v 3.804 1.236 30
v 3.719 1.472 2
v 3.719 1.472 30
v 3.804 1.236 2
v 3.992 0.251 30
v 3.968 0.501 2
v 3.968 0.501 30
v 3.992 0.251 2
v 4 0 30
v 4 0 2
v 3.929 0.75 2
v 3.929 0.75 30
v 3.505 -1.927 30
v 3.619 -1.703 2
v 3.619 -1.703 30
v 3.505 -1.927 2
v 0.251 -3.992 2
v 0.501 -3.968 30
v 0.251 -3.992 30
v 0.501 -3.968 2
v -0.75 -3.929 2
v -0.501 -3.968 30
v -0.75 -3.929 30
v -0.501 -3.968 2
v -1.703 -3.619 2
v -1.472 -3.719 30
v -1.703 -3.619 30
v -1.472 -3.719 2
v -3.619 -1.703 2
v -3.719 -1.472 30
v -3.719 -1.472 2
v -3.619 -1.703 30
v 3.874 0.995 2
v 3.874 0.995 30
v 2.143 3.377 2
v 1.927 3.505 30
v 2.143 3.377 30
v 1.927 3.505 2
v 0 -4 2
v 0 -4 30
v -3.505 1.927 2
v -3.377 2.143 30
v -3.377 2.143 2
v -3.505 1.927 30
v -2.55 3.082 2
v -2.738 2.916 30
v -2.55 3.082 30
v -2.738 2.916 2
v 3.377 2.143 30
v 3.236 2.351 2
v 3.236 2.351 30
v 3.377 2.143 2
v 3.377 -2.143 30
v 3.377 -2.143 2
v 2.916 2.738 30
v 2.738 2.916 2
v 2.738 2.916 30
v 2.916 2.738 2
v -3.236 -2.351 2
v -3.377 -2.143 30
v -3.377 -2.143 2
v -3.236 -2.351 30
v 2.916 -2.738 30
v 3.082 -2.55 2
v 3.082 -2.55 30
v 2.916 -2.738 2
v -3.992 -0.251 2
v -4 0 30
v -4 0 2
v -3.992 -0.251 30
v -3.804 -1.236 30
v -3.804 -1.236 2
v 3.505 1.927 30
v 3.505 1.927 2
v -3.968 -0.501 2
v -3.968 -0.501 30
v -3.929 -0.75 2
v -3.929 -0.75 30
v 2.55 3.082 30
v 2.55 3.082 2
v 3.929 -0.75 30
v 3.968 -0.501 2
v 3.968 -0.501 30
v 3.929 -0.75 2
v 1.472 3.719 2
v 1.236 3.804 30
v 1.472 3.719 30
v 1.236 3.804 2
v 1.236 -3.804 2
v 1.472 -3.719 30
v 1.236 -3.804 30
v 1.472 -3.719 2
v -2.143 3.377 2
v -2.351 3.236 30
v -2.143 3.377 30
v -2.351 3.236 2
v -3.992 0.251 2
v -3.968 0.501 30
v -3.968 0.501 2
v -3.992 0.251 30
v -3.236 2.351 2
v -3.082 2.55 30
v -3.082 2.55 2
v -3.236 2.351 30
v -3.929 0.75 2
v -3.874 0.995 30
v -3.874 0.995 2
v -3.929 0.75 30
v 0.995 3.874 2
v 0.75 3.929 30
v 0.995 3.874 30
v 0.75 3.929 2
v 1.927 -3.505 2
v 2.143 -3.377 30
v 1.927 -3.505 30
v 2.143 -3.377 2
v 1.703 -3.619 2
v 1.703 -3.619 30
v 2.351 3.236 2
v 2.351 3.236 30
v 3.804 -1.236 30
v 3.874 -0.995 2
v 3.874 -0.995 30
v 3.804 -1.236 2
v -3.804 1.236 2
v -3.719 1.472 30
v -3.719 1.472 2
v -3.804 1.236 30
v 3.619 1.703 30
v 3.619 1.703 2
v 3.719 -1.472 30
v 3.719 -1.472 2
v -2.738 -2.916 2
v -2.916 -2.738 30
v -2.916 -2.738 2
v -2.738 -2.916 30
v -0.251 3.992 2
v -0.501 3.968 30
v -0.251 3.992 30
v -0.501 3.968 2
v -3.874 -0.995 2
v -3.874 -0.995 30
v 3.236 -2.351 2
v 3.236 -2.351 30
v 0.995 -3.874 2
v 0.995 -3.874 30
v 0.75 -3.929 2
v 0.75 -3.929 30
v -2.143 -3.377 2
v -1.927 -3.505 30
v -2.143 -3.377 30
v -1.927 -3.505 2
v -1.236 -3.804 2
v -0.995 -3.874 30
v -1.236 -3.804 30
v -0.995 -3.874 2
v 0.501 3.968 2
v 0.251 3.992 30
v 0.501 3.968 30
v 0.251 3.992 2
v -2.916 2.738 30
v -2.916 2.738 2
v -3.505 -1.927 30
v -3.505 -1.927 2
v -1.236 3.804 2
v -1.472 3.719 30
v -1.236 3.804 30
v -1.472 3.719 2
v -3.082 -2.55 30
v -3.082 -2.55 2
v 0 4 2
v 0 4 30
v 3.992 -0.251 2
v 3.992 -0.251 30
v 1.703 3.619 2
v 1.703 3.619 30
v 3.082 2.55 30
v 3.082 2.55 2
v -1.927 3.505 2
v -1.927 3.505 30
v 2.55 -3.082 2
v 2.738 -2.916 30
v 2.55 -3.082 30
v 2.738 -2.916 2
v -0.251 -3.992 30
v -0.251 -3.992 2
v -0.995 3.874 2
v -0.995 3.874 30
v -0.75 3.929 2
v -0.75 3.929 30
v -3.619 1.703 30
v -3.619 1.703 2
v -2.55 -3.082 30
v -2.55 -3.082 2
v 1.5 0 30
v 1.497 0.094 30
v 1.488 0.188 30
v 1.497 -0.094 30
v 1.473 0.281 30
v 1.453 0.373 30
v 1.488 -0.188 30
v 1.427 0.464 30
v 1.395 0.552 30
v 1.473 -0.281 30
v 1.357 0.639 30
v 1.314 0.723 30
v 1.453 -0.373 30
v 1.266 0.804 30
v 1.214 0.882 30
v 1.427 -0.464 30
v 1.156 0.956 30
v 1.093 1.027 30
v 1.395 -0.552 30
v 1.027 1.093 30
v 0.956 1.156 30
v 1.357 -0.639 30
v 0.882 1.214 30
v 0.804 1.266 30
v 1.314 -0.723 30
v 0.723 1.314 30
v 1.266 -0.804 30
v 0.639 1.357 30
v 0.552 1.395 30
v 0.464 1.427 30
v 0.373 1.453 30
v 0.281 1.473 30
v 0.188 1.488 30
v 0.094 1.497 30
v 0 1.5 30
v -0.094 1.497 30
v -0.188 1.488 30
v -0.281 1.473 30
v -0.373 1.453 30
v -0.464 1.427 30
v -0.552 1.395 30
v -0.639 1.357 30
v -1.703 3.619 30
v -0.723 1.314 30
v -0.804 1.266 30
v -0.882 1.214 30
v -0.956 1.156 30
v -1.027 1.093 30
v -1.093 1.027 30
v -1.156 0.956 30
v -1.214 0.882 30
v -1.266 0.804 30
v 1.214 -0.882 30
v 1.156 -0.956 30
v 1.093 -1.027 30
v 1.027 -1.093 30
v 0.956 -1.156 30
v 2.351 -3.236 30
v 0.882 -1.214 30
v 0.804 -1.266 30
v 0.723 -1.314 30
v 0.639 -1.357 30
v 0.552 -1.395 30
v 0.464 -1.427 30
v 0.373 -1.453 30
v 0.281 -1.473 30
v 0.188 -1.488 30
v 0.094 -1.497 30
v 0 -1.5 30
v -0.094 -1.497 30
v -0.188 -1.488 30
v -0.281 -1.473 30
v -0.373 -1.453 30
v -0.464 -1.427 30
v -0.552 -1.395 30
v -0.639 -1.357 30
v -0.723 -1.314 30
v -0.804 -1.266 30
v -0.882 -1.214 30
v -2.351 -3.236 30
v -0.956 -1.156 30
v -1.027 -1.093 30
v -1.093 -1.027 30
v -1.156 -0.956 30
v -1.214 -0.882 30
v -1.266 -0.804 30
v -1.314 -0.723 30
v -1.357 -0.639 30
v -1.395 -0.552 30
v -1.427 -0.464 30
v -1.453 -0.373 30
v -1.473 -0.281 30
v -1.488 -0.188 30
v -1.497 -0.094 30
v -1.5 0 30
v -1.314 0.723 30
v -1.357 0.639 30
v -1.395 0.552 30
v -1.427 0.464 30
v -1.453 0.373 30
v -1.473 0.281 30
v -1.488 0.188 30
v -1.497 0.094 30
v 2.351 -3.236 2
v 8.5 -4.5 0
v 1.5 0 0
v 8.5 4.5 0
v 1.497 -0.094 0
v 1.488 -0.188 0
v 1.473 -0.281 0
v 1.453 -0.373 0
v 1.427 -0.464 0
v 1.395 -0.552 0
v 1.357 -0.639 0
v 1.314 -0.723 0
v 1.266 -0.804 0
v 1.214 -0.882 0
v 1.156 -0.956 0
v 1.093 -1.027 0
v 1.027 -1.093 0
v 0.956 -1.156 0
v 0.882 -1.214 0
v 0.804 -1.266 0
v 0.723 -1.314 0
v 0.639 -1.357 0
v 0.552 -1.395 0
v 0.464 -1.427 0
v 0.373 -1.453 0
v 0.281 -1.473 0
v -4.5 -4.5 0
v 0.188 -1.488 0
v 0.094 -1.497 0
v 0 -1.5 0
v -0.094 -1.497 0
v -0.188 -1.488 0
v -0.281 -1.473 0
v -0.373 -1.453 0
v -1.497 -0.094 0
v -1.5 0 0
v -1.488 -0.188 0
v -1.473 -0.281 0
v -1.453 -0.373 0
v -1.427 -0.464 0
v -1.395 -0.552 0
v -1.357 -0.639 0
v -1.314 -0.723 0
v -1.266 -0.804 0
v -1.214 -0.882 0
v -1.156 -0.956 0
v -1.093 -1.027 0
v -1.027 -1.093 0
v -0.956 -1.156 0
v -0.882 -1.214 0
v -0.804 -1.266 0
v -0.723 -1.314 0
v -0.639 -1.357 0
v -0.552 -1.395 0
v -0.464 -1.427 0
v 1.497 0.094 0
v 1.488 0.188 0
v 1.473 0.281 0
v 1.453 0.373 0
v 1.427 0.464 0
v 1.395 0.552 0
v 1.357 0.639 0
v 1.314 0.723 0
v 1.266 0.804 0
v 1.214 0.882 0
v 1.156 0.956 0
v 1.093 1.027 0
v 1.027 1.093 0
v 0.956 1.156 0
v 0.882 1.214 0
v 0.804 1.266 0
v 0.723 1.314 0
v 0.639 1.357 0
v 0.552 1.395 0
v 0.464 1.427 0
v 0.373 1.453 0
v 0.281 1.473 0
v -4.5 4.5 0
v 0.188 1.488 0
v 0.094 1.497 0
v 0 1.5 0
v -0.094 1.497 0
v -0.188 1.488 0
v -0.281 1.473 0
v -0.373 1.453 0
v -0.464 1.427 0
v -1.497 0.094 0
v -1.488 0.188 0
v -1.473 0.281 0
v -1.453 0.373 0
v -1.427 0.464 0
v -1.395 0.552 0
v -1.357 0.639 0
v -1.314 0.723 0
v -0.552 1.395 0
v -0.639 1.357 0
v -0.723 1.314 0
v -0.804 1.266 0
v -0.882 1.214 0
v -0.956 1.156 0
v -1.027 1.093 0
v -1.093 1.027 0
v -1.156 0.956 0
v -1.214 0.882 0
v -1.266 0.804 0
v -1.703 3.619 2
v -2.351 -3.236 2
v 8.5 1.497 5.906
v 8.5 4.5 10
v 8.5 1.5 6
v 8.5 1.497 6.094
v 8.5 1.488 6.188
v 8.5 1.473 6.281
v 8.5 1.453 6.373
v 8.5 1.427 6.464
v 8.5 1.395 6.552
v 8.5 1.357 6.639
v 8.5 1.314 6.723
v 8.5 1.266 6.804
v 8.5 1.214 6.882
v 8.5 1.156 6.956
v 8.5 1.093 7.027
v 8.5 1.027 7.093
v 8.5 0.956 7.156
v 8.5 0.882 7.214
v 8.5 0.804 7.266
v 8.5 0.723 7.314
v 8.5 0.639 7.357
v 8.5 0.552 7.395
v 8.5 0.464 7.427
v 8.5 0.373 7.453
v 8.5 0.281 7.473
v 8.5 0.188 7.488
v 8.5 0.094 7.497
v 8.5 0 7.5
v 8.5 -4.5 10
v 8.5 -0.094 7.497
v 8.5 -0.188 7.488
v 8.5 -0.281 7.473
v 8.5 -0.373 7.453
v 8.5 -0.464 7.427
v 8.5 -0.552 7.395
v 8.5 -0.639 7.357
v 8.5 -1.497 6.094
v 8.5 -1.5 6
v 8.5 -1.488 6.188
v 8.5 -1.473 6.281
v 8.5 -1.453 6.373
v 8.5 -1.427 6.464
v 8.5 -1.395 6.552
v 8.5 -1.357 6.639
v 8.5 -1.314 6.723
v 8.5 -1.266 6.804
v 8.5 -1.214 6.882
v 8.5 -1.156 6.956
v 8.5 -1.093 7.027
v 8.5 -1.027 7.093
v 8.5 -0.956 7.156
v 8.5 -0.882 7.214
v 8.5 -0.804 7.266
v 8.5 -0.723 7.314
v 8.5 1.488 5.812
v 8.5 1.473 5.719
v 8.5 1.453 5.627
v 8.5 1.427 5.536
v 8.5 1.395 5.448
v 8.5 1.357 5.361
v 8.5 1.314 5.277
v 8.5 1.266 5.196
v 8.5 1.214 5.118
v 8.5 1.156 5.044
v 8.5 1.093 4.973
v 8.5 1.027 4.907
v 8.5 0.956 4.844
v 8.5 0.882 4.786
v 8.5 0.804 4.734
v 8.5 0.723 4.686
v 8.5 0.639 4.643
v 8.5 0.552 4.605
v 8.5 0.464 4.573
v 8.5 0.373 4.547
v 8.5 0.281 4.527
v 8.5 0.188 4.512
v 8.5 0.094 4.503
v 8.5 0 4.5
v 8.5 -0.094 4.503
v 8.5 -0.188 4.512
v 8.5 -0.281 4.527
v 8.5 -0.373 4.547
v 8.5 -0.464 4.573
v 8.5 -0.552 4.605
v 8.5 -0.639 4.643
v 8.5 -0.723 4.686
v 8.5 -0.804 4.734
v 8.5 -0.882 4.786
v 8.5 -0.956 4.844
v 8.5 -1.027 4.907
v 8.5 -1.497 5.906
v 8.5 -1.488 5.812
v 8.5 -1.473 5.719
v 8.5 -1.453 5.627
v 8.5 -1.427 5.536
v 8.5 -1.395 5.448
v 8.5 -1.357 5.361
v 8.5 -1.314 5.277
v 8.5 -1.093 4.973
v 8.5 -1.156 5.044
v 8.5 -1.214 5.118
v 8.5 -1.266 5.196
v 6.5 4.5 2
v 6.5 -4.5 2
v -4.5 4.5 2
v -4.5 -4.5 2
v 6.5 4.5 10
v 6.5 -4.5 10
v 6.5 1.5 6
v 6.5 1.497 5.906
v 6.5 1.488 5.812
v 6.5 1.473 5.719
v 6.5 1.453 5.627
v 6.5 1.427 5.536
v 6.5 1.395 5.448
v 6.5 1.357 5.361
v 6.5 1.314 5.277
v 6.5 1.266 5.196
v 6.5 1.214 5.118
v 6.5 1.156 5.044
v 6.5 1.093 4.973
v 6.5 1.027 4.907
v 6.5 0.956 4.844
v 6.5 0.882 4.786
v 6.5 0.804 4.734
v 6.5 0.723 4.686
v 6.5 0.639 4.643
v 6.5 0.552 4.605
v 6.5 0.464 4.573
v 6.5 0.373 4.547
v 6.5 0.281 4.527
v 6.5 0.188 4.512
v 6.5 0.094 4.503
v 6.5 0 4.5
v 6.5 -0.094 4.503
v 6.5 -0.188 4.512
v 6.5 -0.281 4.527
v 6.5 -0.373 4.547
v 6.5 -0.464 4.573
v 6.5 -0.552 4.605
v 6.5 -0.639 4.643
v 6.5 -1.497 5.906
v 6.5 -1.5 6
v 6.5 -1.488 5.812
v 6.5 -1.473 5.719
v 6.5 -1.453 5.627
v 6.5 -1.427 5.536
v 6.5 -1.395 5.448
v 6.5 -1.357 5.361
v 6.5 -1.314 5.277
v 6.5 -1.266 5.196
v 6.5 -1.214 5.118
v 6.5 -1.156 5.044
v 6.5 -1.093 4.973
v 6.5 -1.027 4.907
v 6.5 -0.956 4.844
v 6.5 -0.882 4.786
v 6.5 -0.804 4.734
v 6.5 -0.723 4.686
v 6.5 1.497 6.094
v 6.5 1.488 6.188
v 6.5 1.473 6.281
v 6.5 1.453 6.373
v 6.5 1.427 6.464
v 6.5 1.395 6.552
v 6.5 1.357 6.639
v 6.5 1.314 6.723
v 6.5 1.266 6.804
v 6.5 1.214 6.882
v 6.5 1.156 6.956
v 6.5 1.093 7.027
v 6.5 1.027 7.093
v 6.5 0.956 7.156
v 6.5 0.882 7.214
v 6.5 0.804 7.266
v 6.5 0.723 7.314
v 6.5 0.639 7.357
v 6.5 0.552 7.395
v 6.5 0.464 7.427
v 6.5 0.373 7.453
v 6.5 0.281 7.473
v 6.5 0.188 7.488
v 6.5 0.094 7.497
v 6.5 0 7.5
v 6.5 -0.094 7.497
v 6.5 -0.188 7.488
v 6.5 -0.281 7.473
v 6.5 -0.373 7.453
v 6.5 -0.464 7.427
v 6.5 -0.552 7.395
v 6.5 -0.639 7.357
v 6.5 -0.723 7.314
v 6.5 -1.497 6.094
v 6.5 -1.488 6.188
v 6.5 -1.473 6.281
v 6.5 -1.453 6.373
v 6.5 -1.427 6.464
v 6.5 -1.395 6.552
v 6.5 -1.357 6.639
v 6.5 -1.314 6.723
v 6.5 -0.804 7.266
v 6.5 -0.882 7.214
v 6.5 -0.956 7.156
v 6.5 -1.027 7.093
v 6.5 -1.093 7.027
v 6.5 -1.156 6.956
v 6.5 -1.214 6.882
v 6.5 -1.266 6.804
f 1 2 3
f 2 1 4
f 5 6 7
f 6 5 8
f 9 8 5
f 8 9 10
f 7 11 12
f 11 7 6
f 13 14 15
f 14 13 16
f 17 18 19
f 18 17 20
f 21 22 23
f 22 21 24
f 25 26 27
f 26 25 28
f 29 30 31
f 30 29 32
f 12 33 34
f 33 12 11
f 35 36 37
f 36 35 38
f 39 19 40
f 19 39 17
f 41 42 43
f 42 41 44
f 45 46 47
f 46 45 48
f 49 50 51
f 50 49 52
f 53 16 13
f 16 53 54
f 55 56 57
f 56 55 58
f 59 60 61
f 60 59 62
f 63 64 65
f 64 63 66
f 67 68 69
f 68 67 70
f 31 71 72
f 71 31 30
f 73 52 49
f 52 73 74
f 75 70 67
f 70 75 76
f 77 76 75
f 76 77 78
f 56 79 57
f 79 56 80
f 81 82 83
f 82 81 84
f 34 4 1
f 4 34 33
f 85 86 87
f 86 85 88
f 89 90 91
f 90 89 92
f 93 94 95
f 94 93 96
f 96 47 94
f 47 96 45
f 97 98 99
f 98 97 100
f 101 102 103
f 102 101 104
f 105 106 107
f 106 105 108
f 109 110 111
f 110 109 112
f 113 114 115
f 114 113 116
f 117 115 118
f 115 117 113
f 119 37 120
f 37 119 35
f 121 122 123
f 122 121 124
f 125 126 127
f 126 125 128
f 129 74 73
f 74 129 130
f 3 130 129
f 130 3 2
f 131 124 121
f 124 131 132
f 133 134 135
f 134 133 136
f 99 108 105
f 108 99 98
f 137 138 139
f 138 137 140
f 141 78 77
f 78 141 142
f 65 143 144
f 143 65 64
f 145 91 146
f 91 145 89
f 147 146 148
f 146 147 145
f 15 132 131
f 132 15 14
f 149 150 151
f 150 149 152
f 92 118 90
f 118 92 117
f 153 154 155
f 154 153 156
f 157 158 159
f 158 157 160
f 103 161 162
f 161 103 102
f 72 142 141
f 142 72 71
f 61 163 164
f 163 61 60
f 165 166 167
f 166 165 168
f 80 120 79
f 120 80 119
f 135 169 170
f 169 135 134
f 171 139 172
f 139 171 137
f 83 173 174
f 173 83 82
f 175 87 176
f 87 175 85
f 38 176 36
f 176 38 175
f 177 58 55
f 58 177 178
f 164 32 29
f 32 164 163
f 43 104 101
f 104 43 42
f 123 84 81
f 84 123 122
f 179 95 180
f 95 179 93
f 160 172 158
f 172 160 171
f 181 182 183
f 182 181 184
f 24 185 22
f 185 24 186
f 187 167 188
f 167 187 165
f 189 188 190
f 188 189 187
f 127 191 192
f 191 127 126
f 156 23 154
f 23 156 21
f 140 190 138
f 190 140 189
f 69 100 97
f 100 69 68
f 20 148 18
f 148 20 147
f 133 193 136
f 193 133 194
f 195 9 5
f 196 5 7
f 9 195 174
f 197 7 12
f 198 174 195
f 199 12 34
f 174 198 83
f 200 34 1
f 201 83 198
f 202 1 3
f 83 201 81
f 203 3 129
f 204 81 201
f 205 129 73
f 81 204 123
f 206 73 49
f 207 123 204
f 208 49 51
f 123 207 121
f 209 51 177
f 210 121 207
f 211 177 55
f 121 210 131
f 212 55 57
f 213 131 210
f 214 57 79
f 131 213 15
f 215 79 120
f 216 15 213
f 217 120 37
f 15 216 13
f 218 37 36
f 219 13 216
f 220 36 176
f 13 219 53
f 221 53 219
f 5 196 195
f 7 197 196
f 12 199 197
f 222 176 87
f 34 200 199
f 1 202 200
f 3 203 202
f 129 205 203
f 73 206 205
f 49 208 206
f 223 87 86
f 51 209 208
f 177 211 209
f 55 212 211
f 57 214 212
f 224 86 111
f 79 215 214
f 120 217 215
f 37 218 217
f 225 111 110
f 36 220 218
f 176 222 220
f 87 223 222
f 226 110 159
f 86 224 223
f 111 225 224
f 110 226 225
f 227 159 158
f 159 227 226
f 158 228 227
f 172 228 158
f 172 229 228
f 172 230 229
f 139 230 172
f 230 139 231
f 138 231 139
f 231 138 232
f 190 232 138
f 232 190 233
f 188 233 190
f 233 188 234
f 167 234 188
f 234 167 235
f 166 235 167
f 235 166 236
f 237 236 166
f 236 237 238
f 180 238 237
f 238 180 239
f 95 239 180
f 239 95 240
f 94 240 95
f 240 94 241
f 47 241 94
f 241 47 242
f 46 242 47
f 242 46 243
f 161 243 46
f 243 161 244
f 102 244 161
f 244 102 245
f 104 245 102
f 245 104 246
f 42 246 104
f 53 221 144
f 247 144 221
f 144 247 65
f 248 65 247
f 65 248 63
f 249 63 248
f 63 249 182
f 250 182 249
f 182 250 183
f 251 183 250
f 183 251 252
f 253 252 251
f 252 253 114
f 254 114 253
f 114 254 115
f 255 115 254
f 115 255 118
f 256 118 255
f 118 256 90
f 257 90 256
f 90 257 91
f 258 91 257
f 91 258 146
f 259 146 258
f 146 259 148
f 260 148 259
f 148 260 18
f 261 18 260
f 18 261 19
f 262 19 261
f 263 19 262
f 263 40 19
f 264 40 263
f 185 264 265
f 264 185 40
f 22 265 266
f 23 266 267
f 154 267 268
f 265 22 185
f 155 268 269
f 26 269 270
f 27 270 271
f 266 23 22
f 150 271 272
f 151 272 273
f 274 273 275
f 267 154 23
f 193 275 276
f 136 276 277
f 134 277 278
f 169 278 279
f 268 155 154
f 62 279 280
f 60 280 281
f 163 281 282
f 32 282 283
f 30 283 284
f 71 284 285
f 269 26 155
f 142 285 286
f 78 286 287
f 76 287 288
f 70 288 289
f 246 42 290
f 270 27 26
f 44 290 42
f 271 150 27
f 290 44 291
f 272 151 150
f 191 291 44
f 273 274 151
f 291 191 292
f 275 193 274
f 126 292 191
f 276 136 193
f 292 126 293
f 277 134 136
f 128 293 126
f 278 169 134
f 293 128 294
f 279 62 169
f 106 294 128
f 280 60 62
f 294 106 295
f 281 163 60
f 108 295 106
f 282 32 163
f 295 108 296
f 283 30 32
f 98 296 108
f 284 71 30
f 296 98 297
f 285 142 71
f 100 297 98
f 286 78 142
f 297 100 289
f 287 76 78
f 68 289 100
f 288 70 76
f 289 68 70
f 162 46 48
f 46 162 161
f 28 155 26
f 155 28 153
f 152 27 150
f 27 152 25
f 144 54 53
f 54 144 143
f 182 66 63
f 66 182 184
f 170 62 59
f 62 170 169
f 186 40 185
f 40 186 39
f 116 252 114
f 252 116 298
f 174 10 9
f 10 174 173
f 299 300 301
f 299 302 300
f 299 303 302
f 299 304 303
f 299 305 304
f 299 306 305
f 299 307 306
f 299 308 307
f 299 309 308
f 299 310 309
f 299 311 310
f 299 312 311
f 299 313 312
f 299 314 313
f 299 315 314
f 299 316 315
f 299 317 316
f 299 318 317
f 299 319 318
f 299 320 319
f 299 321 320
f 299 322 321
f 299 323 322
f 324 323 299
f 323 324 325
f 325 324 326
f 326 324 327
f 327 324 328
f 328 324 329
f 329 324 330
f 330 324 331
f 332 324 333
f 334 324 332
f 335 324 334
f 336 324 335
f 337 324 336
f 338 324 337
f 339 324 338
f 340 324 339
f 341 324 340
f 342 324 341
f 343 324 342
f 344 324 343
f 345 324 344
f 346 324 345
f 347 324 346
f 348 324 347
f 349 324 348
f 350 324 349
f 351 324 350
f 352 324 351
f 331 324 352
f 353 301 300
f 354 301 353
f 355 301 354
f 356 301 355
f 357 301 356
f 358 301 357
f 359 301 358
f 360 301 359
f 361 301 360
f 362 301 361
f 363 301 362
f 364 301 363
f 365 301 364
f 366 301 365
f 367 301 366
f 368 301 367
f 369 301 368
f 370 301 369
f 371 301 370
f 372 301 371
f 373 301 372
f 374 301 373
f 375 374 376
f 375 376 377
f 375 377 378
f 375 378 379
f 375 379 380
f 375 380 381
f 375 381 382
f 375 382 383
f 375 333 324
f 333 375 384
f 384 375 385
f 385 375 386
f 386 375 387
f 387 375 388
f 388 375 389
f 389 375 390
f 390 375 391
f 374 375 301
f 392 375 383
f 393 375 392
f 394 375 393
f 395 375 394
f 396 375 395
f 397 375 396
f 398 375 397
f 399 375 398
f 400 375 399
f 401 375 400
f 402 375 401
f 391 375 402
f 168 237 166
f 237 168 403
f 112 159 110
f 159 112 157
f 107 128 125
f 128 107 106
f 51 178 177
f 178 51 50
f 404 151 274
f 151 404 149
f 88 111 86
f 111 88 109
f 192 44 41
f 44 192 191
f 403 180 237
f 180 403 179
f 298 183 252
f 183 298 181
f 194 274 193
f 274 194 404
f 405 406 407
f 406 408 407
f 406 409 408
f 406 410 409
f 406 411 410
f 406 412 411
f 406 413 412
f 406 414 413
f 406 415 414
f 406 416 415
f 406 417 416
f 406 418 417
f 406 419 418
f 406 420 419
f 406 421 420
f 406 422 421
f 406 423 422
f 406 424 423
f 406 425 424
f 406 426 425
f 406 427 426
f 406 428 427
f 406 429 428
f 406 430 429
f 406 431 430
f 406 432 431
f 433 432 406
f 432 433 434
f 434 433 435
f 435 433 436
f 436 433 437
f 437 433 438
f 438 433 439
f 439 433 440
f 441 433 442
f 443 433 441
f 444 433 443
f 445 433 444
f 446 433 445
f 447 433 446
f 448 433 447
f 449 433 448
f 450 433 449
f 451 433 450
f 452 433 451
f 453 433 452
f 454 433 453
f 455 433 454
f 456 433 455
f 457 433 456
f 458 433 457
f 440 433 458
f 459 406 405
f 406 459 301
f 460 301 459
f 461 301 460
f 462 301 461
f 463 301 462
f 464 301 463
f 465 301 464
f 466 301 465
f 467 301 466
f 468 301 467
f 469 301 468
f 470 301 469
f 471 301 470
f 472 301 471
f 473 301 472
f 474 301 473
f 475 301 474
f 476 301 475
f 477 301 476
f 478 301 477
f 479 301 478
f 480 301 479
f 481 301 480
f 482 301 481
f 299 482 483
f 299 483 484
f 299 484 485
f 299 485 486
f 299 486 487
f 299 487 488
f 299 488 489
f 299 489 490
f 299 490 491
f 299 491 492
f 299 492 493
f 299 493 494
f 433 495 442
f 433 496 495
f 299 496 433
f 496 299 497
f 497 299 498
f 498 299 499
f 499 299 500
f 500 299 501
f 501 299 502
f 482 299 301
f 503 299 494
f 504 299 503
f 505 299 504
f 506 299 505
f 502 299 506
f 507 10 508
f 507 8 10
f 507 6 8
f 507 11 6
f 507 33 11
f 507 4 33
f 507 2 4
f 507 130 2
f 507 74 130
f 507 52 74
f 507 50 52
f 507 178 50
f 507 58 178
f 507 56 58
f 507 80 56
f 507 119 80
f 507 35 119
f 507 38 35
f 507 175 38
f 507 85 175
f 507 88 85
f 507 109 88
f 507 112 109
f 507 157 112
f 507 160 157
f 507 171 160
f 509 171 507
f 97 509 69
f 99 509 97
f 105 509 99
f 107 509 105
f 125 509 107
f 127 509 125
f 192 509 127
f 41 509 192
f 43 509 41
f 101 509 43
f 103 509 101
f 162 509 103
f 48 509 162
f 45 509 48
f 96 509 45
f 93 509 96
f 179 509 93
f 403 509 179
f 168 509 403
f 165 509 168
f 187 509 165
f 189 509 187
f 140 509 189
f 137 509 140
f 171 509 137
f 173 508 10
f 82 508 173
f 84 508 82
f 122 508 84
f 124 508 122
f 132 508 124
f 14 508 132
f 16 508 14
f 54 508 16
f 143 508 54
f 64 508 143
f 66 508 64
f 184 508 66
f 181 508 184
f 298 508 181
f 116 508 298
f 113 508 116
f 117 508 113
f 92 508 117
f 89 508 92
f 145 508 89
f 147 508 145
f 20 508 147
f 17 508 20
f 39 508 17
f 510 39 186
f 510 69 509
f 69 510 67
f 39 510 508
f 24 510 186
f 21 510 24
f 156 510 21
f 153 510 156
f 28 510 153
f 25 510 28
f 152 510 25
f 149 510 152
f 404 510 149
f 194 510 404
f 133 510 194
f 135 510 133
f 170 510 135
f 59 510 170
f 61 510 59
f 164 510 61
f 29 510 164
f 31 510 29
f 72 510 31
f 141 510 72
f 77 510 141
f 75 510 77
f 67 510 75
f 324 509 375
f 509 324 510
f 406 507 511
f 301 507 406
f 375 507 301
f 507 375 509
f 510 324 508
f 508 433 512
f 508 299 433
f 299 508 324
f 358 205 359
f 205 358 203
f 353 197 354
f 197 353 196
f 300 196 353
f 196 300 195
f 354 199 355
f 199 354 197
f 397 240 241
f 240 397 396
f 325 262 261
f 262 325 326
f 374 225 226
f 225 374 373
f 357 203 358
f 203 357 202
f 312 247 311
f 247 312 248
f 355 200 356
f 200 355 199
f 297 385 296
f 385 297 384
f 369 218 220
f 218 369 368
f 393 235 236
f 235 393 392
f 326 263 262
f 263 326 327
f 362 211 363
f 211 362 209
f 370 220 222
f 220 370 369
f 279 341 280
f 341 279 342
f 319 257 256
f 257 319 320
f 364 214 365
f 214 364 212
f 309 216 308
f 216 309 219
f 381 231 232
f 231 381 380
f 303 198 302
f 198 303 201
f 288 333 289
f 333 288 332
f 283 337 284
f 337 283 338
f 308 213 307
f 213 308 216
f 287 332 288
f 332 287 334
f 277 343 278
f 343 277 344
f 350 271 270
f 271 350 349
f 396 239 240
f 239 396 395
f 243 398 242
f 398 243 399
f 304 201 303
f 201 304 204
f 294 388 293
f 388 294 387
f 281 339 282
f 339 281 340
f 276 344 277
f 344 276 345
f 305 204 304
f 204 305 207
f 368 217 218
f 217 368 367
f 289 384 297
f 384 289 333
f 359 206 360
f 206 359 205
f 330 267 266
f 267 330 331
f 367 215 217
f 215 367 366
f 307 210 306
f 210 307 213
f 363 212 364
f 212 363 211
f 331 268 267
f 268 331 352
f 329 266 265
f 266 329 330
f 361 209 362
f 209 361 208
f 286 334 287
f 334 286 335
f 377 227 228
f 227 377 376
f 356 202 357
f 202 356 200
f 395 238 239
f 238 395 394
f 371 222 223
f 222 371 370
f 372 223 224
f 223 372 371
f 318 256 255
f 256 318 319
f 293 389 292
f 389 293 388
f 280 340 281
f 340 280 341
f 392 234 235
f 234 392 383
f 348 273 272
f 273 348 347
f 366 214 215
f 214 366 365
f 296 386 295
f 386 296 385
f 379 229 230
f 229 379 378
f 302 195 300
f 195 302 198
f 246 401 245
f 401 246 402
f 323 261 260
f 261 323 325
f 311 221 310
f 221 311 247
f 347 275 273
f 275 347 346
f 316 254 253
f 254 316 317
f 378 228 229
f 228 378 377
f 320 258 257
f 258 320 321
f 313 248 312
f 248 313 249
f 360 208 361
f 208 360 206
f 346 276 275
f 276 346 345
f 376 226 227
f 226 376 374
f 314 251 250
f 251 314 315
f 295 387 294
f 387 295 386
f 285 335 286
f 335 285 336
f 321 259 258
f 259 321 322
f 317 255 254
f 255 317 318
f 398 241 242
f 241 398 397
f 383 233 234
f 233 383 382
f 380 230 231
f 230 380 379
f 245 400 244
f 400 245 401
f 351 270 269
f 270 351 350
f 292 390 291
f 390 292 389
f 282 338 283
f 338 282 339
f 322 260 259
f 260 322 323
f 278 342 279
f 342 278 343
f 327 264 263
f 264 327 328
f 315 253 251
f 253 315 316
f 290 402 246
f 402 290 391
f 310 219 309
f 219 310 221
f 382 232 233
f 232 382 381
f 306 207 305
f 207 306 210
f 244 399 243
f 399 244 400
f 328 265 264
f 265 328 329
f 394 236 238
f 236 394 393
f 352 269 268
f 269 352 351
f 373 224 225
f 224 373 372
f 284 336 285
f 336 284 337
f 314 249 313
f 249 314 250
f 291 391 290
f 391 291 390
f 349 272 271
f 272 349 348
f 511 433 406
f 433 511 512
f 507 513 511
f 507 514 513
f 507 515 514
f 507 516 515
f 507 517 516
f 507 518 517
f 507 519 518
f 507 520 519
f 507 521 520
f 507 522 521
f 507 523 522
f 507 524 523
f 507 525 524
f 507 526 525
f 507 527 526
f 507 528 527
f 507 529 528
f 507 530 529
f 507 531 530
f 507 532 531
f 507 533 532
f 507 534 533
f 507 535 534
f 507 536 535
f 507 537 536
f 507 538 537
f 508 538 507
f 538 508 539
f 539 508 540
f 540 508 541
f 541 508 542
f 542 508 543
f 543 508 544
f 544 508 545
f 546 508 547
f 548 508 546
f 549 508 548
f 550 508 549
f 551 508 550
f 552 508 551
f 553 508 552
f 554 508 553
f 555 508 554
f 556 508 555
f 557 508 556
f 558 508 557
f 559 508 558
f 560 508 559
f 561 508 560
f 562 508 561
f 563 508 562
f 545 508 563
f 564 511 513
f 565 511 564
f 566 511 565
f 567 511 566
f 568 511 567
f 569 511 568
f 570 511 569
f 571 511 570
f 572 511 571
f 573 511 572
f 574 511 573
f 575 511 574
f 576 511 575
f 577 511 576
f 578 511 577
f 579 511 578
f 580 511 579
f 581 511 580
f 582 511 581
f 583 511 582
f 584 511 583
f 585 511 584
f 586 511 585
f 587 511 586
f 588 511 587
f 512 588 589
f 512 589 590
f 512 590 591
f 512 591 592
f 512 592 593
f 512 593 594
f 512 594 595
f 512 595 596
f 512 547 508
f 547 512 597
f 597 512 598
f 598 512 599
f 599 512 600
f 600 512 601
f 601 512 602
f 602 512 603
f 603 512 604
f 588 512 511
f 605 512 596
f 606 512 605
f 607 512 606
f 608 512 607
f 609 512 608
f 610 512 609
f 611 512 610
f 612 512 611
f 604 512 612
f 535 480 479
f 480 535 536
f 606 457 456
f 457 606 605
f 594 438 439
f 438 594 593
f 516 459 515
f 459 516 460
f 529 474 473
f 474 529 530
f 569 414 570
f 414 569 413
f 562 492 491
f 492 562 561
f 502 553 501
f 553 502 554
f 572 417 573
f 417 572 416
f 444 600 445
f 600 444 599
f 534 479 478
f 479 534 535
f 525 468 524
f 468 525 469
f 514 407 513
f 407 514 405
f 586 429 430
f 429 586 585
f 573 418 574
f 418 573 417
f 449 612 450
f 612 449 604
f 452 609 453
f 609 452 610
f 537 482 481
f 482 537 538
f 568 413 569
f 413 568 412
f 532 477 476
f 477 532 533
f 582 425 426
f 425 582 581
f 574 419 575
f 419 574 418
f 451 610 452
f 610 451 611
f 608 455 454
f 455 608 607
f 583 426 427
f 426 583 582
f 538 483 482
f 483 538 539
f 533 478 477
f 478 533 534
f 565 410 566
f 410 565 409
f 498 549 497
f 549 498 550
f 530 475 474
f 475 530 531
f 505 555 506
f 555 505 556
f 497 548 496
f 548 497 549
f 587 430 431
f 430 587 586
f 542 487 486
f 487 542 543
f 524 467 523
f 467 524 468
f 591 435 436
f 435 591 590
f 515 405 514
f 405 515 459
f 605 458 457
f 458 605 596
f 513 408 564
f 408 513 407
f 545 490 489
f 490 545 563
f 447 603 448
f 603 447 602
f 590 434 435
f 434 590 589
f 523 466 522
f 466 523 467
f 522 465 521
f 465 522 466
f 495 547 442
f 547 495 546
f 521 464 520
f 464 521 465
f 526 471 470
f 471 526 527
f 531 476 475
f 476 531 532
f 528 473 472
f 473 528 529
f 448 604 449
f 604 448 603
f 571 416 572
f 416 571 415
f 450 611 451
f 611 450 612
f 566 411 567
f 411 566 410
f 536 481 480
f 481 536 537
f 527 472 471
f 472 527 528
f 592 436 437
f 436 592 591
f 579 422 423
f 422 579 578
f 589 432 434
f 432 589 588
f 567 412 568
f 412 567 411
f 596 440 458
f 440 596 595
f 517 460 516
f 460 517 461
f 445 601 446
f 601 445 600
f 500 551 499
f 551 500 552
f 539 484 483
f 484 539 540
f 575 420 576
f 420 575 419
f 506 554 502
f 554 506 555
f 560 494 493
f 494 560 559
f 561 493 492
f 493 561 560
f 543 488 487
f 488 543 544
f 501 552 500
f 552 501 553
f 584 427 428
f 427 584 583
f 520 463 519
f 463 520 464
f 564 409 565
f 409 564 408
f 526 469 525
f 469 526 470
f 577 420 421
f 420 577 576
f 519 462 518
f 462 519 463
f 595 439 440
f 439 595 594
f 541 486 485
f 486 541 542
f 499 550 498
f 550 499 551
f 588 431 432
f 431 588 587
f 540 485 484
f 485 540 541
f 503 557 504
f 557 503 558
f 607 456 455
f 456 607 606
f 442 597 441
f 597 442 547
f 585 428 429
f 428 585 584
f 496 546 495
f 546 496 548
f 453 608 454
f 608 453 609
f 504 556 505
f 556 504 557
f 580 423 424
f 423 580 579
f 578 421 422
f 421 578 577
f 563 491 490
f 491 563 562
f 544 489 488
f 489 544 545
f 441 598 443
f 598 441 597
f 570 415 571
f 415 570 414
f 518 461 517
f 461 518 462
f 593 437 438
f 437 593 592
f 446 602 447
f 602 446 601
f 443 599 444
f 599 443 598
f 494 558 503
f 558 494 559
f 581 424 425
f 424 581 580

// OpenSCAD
$fn=100;

difference()
{
    union() {
        cylinder(d=8,h=30);
        translate([-4.5,-4.5,0]) cube([13,9,2]);
            }
    cylinder(d=3,h=31);
}
difference()
{
    translate([6.5,-4.5,0]) cube([2,9,10]);
    #rotate([0,90,0]) translate([-6,0,6]) cylinder(d=3,h=3);
}
